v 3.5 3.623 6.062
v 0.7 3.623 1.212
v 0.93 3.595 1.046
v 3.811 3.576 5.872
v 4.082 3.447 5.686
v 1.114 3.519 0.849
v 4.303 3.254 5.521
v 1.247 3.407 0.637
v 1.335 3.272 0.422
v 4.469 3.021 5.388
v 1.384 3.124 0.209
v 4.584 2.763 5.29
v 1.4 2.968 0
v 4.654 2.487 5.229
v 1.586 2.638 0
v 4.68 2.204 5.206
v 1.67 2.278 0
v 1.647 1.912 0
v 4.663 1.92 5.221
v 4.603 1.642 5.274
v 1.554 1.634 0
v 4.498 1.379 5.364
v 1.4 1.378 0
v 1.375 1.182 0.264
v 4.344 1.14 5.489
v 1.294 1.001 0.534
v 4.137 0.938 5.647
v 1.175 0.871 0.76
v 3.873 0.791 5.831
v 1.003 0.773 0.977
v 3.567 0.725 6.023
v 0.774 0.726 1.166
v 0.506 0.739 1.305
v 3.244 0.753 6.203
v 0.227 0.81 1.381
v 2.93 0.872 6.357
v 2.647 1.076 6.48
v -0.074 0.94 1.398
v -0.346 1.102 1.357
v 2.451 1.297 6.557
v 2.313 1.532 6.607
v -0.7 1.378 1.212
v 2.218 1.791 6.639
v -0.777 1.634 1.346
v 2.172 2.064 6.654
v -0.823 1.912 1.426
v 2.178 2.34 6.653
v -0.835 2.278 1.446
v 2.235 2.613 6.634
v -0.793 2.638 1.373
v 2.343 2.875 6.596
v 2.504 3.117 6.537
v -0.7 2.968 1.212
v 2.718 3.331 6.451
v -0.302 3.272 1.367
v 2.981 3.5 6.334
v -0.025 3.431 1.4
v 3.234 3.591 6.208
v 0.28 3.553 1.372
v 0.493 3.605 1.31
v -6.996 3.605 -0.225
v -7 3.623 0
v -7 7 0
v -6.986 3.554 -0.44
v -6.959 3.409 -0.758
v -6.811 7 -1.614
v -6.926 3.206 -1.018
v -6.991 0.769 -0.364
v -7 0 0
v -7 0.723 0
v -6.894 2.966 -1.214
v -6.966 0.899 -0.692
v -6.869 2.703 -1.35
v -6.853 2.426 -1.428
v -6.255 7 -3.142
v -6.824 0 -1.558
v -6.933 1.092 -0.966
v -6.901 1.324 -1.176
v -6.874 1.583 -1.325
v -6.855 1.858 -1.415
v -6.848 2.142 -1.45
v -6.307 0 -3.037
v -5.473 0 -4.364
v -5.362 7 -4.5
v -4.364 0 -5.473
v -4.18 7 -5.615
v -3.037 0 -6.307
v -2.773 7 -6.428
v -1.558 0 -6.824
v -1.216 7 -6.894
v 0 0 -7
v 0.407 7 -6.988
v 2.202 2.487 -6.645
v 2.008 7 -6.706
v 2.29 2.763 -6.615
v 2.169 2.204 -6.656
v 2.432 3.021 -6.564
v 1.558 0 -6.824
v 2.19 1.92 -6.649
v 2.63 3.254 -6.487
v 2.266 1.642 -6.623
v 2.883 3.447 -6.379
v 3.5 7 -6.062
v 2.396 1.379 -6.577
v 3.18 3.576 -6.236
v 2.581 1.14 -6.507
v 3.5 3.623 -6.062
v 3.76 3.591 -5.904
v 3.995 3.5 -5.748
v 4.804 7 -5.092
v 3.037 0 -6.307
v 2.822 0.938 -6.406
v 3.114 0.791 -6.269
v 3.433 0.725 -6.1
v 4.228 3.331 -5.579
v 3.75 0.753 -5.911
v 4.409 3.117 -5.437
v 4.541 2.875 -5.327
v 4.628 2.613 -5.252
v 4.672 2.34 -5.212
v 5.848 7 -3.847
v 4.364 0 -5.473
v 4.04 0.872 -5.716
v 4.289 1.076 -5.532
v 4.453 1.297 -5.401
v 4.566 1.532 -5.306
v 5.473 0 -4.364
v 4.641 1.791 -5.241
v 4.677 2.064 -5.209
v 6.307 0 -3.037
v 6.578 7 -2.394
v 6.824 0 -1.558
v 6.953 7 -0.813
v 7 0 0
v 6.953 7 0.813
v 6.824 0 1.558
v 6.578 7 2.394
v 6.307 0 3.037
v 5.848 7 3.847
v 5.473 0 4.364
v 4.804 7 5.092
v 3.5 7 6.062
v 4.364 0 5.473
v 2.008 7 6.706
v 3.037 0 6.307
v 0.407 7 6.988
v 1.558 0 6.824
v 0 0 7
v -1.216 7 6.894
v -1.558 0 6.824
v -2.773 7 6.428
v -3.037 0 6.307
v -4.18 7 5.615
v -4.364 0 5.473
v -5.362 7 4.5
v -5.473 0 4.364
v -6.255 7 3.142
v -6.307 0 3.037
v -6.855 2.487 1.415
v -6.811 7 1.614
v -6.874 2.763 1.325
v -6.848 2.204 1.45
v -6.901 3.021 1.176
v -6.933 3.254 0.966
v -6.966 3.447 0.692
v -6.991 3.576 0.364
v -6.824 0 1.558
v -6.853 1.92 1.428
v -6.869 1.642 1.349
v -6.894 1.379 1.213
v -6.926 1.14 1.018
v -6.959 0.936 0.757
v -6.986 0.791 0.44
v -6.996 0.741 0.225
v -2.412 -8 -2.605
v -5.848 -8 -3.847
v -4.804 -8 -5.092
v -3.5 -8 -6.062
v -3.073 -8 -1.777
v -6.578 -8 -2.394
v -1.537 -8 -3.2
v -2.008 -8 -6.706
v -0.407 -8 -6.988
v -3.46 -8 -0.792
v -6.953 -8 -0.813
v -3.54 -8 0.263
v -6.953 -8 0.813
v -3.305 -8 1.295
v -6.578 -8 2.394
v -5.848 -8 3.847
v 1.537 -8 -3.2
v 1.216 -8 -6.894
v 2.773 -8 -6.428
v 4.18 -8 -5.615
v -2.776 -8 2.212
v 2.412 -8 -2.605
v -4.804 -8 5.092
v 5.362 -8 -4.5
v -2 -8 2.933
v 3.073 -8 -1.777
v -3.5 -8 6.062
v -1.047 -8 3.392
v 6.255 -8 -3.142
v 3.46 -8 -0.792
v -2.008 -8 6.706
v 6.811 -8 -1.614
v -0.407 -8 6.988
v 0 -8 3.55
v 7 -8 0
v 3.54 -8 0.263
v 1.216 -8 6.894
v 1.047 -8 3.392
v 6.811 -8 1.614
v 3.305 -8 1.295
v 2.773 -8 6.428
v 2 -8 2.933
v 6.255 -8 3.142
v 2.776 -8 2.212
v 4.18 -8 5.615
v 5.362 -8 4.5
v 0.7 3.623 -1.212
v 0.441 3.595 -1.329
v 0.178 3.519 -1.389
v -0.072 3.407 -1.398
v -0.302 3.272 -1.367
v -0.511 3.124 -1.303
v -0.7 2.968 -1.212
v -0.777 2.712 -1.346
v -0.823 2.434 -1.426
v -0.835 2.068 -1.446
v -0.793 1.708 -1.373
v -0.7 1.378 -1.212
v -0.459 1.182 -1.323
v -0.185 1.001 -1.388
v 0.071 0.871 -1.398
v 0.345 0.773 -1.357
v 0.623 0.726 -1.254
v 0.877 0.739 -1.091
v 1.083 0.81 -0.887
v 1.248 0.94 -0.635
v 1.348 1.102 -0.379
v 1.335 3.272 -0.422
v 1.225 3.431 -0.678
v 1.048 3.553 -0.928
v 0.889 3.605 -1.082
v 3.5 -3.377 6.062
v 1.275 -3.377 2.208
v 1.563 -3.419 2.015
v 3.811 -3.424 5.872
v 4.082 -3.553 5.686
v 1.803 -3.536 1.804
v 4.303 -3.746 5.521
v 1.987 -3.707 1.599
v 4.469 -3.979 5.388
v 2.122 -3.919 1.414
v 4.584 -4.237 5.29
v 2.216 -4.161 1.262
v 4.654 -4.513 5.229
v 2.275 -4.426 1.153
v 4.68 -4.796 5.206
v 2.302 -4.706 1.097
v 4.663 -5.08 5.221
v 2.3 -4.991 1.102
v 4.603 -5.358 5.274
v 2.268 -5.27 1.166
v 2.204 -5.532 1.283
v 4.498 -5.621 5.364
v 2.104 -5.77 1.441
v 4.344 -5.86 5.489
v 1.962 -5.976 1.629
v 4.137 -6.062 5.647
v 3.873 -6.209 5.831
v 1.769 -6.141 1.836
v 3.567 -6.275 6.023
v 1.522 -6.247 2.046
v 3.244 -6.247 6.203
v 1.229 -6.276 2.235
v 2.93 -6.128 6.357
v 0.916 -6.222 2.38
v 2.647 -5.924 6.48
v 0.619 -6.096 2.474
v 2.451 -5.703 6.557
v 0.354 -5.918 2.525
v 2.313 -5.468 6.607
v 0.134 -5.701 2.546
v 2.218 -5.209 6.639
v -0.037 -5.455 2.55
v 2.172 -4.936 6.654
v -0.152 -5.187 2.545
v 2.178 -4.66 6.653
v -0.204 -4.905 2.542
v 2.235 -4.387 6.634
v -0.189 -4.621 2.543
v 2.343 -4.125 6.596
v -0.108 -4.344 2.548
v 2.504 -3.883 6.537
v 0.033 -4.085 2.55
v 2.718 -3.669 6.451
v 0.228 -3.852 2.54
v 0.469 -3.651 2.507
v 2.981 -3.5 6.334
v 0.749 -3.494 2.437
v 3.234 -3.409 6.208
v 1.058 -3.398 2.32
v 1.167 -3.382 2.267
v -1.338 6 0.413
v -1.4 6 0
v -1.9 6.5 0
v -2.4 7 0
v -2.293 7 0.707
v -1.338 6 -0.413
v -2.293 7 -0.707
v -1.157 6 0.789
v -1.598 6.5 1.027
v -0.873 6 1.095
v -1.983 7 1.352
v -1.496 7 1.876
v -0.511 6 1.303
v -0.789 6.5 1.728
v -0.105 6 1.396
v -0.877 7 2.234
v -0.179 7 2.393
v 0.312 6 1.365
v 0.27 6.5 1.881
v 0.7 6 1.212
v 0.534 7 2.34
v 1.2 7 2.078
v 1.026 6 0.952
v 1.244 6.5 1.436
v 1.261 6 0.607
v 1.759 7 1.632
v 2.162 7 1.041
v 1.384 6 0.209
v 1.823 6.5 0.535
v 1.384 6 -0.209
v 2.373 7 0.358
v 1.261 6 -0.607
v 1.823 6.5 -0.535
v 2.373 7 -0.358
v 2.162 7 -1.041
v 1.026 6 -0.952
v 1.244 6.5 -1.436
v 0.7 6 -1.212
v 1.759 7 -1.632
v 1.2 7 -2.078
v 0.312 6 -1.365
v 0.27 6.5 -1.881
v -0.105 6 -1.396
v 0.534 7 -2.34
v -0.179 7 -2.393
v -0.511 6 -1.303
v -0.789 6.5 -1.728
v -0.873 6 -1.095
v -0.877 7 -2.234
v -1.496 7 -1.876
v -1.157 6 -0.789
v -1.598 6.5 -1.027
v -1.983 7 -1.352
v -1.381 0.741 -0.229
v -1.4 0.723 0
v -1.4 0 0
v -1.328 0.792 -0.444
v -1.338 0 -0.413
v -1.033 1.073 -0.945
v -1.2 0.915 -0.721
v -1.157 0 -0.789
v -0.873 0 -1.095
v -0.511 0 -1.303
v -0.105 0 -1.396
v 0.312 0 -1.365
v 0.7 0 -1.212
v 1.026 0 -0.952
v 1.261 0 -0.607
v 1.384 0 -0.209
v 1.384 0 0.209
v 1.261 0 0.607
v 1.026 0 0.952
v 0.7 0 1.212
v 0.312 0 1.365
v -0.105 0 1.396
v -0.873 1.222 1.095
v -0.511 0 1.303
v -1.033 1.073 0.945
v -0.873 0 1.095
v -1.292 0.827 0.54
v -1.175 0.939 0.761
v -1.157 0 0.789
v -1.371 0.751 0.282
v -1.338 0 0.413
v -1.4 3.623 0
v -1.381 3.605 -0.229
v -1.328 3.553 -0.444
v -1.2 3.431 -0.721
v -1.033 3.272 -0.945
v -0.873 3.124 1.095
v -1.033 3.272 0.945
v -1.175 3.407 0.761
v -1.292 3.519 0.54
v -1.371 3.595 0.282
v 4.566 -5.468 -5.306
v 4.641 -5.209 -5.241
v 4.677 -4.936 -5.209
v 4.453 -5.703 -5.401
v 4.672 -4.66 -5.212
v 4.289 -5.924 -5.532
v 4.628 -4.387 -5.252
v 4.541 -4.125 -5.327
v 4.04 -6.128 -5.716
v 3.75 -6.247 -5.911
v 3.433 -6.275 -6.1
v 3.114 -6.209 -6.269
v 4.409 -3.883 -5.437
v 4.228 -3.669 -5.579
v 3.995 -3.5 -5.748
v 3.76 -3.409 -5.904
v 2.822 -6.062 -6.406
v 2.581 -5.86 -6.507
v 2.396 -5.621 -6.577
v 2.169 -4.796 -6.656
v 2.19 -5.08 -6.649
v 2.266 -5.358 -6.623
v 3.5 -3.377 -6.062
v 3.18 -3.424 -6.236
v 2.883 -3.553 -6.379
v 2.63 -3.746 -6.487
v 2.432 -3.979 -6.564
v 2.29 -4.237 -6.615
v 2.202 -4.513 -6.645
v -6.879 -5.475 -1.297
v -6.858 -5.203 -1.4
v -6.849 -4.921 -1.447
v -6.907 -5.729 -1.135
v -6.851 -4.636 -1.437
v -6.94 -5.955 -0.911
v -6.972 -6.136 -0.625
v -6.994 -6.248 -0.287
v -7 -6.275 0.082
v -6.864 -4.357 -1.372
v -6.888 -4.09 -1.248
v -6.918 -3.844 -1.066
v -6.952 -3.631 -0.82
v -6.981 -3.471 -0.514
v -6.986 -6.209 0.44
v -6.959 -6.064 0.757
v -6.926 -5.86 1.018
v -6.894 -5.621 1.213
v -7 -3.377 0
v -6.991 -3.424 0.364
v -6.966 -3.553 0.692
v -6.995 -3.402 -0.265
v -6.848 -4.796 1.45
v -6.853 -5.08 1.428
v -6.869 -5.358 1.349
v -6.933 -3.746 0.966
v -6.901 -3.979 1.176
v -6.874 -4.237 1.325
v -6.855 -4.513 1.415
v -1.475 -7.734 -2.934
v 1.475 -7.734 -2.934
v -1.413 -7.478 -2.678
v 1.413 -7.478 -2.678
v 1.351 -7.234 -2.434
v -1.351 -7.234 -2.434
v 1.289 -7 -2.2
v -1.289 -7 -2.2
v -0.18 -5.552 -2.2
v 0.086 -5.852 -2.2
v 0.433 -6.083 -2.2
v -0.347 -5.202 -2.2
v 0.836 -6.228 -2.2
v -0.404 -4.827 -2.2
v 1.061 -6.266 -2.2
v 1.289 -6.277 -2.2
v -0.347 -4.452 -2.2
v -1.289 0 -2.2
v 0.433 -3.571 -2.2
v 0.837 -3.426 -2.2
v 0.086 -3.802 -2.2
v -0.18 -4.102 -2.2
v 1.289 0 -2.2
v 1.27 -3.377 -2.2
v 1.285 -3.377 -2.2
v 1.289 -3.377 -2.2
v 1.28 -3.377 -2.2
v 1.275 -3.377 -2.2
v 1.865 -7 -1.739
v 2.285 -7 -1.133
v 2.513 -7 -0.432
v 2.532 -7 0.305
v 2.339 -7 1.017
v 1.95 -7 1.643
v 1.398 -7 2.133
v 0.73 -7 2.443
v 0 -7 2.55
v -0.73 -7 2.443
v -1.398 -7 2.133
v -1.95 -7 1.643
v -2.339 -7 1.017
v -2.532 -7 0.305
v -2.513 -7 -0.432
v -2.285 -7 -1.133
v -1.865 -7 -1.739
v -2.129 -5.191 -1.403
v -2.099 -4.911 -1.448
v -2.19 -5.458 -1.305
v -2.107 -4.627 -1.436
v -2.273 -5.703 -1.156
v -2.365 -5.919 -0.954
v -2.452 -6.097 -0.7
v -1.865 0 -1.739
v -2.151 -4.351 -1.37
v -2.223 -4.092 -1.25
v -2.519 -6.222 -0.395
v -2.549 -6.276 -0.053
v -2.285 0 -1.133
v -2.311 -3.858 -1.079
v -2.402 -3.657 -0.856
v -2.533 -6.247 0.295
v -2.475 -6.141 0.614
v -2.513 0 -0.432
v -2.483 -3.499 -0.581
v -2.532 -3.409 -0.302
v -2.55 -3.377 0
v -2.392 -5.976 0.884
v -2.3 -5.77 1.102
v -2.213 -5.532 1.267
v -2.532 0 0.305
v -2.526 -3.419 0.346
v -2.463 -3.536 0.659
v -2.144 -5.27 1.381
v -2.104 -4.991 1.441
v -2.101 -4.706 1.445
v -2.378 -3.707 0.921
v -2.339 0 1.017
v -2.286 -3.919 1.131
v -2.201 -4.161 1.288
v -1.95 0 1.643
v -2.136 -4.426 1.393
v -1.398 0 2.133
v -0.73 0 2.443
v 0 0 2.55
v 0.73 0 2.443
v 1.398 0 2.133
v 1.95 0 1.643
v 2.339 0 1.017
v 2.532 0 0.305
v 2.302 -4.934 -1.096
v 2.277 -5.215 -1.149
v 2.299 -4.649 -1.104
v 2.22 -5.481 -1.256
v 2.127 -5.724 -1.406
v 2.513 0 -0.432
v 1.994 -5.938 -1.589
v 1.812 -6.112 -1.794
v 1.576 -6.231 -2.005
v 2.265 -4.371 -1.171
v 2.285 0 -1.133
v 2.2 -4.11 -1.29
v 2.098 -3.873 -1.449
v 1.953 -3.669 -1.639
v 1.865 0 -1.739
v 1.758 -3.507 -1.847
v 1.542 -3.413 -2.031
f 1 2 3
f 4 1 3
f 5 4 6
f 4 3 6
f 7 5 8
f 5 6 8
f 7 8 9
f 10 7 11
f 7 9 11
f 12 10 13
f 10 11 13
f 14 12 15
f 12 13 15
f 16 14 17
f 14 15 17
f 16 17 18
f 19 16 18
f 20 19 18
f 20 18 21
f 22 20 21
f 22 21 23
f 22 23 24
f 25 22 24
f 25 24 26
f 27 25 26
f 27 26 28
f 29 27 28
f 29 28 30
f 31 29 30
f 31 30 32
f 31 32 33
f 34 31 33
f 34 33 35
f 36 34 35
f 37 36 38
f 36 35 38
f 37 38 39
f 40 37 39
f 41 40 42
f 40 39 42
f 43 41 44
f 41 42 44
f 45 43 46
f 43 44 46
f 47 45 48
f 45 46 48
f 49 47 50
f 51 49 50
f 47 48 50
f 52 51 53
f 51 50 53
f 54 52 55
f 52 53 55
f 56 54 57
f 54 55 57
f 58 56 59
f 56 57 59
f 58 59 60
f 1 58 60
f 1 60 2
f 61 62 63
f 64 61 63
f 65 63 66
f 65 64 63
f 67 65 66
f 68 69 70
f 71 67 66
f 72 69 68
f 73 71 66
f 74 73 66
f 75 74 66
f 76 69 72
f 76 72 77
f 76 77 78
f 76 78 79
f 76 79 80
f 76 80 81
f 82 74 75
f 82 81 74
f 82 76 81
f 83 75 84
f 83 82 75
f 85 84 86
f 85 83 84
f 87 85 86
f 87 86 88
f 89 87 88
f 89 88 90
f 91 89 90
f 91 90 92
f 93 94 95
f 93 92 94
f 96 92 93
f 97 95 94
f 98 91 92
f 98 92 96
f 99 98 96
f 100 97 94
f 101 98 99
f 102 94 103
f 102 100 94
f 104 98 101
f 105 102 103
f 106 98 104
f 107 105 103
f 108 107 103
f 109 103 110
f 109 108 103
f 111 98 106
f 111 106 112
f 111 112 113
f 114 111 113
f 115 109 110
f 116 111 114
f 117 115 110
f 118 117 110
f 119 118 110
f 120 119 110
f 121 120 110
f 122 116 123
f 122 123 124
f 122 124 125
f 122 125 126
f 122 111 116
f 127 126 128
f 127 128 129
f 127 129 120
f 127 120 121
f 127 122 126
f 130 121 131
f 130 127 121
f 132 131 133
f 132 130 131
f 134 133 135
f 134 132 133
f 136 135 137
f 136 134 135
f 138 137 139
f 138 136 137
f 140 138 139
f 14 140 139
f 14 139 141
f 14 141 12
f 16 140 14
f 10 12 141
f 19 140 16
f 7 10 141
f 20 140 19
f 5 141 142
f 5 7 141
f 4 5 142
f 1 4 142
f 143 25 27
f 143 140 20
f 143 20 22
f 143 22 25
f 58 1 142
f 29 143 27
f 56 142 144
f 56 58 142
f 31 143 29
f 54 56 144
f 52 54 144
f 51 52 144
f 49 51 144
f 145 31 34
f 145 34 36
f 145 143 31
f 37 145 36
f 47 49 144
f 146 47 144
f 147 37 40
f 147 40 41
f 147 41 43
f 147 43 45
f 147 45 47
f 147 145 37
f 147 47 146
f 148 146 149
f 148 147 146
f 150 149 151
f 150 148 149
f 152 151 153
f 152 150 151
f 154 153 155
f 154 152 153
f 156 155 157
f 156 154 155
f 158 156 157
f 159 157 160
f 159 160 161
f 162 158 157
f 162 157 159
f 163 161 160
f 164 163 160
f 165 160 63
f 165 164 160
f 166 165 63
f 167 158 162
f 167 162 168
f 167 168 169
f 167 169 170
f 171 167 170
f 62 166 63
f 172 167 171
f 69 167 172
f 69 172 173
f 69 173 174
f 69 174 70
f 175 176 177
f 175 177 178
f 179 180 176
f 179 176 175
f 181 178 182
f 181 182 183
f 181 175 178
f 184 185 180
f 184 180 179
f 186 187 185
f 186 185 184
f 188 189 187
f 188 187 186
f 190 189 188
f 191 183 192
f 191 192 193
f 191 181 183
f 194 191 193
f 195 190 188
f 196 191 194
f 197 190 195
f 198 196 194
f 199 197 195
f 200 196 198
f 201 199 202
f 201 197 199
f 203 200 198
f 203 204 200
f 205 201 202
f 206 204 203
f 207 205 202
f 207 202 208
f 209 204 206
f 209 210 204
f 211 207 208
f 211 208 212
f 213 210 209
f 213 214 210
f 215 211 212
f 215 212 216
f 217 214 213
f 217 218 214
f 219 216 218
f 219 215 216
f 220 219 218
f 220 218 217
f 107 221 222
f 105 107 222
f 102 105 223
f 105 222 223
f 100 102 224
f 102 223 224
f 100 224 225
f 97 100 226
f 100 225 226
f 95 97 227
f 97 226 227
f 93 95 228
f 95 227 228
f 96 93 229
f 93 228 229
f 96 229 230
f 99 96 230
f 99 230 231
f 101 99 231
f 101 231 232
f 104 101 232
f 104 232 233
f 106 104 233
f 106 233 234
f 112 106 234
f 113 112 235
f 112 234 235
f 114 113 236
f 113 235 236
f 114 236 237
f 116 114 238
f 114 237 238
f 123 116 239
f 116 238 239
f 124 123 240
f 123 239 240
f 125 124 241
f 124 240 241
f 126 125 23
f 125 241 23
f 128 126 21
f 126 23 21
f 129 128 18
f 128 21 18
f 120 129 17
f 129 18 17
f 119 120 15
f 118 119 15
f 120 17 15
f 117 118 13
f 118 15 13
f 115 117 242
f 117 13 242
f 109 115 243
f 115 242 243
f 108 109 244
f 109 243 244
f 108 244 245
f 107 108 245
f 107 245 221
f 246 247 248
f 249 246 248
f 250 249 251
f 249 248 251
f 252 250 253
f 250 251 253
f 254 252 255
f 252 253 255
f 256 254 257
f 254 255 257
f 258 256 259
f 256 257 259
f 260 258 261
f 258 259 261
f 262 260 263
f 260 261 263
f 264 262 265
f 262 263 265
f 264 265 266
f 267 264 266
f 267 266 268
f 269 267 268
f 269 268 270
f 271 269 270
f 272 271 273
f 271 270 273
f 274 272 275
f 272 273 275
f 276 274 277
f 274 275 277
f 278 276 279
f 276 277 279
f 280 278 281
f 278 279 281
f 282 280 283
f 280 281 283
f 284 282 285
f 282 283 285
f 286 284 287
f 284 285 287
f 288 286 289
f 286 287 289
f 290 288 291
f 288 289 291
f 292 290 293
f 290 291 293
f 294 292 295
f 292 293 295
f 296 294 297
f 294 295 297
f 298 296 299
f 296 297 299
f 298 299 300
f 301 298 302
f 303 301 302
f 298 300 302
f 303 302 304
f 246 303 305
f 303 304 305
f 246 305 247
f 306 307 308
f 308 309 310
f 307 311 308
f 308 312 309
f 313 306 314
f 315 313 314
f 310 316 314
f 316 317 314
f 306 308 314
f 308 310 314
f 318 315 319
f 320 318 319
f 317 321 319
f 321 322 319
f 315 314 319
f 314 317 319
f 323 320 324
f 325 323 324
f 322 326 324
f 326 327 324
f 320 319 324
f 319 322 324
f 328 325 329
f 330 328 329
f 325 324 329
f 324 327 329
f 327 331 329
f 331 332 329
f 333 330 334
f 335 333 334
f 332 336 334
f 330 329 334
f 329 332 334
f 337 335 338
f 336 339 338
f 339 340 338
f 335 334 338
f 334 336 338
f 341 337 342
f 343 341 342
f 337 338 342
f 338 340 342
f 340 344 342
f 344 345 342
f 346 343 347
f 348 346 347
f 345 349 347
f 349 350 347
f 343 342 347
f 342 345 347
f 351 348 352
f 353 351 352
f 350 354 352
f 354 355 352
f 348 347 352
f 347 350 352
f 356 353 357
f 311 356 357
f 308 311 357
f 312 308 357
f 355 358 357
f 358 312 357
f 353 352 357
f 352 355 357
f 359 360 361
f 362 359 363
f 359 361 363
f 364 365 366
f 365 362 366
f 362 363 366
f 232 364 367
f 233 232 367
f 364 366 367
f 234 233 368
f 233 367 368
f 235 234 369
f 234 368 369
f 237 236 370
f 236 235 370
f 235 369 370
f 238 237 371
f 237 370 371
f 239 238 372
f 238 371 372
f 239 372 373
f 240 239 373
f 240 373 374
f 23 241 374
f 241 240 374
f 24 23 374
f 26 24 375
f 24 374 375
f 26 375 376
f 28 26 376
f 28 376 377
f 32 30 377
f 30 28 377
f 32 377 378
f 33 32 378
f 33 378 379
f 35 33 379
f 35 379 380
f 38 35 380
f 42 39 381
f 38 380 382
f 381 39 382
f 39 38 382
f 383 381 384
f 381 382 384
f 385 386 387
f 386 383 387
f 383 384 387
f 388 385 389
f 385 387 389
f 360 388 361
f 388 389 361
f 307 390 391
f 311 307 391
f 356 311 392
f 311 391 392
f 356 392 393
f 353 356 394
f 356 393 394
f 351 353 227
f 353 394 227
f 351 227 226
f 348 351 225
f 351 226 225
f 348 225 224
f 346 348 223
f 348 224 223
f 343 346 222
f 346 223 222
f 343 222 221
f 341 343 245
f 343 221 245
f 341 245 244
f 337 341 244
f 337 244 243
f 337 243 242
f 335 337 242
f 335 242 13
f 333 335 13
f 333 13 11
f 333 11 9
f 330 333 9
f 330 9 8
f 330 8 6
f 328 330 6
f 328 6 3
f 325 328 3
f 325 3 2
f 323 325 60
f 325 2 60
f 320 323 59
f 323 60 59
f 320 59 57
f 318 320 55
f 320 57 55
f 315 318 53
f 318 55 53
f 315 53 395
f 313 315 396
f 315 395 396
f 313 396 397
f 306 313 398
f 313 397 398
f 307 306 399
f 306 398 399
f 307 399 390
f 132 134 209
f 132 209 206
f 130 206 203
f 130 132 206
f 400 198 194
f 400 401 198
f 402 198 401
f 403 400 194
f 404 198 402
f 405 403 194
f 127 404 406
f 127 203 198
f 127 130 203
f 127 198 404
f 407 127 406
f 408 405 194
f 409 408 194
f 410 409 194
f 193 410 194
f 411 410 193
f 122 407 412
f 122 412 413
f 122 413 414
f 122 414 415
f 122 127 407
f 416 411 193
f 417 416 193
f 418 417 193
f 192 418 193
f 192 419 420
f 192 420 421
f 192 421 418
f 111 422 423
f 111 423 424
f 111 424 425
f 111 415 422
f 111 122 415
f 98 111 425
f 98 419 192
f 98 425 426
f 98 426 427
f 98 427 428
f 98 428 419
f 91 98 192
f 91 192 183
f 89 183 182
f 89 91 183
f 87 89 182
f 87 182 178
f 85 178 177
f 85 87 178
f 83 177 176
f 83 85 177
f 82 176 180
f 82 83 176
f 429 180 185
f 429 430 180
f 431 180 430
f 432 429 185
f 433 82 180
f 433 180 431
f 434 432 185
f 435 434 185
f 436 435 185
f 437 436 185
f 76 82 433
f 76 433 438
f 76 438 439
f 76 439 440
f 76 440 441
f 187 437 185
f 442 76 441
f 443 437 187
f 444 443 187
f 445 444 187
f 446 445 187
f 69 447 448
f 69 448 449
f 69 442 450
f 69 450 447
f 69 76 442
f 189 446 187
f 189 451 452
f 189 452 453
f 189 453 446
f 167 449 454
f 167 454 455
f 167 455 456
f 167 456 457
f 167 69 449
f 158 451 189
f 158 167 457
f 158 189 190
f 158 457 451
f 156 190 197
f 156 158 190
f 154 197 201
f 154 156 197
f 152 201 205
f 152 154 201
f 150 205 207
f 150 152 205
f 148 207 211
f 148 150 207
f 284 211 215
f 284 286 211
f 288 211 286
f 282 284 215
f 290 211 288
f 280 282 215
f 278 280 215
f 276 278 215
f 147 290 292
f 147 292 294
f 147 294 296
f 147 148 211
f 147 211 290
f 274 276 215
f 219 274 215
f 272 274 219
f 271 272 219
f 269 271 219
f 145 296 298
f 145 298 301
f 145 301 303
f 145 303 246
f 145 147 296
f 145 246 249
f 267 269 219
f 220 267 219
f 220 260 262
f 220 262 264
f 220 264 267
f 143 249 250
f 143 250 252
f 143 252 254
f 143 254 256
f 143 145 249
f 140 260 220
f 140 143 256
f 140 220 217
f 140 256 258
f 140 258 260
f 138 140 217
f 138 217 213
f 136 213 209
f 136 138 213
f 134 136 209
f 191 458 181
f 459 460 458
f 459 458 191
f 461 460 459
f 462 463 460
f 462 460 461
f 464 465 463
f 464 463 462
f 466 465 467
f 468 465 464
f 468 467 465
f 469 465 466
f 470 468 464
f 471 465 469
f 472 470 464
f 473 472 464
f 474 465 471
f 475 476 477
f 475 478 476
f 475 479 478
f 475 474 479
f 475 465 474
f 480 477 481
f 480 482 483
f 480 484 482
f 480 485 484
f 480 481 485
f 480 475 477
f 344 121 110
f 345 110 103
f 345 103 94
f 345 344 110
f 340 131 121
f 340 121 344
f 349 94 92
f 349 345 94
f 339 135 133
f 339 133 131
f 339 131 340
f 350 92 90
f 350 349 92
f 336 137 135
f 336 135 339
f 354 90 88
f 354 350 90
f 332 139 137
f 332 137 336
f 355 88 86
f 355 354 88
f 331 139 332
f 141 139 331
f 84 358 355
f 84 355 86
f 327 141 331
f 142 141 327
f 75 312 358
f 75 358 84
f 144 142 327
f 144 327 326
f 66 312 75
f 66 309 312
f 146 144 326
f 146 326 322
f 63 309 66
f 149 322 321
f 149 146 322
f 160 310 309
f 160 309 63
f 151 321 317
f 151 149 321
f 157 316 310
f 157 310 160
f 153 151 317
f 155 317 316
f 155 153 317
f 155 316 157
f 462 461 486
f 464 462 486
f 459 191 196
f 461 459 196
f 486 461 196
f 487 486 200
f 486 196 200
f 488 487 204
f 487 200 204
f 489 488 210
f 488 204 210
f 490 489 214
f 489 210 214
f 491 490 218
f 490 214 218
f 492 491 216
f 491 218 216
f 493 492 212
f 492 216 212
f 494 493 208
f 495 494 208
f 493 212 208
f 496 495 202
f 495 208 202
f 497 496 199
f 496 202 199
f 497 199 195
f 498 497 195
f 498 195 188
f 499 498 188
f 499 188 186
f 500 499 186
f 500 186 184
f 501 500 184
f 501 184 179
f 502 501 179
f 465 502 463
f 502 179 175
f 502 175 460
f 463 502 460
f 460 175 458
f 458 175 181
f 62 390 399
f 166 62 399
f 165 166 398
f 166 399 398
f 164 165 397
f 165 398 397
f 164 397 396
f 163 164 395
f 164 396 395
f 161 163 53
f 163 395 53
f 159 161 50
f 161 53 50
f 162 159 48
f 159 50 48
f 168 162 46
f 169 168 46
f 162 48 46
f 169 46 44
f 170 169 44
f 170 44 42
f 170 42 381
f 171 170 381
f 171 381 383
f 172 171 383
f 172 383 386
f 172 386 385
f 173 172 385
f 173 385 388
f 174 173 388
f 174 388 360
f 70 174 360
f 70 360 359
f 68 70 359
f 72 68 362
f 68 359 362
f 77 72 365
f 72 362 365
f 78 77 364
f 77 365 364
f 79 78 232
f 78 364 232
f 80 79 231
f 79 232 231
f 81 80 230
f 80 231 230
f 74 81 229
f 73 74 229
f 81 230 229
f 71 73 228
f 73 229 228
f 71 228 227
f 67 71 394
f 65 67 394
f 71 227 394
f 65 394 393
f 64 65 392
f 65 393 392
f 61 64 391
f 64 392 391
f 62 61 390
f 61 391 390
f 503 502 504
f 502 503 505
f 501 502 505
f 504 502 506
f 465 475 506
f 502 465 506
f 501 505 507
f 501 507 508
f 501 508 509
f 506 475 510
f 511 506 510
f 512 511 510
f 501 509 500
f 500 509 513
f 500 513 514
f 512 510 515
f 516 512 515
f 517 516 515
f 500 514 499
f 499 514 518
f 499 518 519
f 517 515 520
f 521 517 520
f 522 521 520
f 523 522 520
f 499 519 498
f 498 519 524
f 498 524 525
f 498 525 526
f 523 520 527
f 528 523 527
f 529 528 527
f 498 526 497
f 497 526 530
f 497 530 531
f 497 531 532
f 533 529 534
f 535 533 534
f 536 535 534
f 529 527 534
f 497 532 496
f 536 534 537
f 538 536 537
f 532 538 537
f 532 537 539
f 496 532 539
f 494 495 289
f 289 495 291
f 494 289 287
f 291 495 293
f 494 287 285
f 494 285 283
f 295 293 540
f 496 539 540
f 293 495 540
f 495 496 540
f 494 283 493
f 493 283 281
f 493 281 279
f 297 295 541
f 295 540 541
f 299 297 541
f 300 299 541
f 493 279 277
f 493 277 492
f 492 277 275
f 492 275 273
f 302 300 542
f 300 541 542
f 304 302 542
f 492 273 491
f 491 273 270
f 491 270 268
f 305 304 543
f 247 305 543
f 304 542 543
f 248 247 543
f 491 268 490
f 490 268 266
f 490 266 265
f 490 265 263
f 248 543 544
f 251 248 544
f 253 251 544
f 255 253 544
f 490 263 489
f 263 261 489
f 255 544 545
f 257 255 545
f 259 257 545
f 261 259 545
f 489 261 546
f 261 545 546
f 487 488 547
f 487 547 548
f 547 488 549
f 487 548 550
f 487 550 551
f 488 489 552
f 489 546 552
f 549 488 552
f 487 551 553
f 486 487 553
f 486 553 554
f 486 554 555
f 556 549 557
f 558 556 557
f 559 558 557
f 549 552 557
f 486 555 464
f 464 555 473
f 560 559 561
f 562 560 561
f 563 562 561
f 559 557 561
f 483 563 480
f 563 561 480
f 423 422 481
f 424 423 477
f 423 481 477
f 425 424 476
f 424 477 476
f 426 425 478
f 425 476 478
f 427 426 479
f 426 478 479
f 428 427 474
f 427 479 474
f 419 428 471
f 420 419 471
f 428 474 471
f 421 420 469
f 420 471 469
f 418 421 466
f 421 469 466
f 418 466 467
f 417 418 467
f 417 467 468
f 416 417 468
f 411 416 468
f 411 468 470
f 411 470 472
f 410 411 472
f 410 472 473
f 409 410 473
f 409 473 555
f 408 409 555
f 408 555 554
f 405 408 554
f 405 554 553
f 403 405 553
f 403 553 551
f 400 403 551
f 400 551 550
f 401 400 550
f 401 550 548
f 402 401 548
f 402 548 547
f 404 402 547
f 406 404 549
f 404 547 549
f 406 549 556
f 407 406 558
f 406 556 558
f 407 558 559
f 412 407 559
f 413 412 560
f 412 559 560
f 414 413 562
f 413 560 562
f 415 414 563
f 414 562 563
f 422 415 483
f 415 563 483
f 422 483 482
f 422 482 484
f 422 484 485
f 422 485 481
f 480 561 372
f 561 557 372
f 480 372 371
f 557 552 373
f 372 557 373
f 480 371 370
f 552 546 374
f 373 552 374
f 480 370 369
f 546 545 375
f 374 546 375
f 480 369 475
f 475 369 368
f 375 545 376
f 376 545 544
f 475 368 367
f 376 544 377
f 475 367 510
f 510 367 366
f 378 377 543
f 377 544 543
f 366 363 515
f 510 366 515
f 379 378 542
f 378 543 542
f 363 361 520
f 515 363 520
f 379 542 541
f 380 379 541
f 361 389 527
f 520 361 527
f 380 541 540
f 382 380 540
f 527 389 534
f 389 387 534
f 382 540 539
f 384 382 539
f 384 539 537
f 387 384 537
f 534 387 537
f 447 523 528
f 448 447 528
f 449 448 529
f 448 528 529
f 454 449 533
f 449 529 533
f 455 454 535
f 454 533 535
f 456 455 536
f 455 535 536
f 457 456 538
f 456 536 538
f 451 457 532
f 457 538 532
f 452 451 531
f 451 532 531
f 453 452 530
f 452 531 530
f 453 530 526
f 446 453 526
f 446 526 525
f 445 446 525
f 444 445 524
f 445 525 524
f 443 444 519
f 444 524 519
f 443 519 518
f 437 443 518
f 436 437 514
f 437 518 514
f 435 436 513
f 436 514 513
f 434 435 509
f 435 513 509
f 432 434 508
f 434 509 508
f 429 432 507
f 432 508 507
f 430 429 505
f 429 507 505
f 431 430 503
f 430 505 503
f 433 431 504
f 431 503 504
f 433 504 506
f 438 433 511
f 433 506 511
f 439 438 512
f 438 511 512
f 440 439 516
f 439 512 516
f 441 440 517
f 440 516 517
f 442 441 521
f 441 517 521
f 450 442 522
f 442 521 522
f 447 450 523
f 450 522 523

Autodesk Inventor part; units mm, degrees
ref_plane "YZ Plane" through (0, 0, 0) normal (1, 0, 0) x (0, 1, 0)
ref_plane "XZ Plane" through (0, 0, 0) normal (0, 1, 0) x (-1, 0, 0)
ref_plane "XY Plane" through (0, 0, 0) normal (0, 0, 1) x (1, 0, 0)
sketch "Sketch1" plane through (0, 0, 0) normal (0, 1, 0) x (-1, 0, 0)
  circle A0 centre (0, 0) radius 7
  line L0 (0, -9.8) -> (0, 9.8) construction
  circle A1 centre (0, 0) radius 1.4
  dimension "d0" = 14
  dimension "d42" = 2.8
extrude "Extrusion1" add sketch "Sketch1" along normal blind 7
sketch "Sketch2" plane through (0, 0, 0) normal (0, -1, 0) x (1, 0, 0)
  circle A0 centre (0, 0) radius 1.45 projected
  arc A1 (1.2894, -2.2) -> (-1.2894, -2.2) centre (0, 0) ccw
  line L0 (-1.2894, -2.2) -> (1.2894, -2.2)
  circle A2 centre (0, 0) radius 7 projected
  dimension "d4" = 5.1
  dimension "d5" = 2.2
extrude "Extrusion2" add sketch "Sketch2" along normal blind 8 contours A2
ref_plane "Work Plane1" through (0, 6, 0) normal (0, -1, 0) x (1, 0, 0)
sketch "Sketch5" plane through (0, 0, 0) normal (1, 0, 0) x (0, 1, 0)
  line L0 (0, 7) -> (7, 7) projected
  line L1 (4.6942, 7) -> (5.9942, 7)
  line L2 (5.9942, 7) -> (5.9942, 5)
  line L3 (5.9942, 5) -> (4.6942, 5)
  line L4 (4.6942, 5) -> (4.6942, 7)
  point P0 (0, 0)
  dimension "d17" = 1.3
  dimension "d18" = 2
sketch "Sketch6" plane through (0, 0, 0) normal (1, 0, 0) x (0, 1, 0)
  circle A0 centre (2.1729, 0) radius 1.45
  line L0 (-8, -7) -> (7, -7) projected
  point P0 (0, 0)
  dimension "d43" = 2.9
  dimension "d44" = 7
extrude "Extrusion5" cut sketch "Sketch6" against normal blind 10
pattern_circular "Circular Pattern3" count 3 over 360 about axis through (0, 0, 0) along (0, 1, 0) of "Extrusion5"
chamfer "Chamfer4" distance 1 angle 45 3 edges at (1.4, 7, 0) (0, -8, 2.55) (0, -8, -2.2)
pattern_linear "Rectangular Pattern2" count 2 spacing 7 along (0, -1, 0) of "Extrusion5", "Circular Pattern3"
properties part number "00_Motorcoupling_5mm_M3"
